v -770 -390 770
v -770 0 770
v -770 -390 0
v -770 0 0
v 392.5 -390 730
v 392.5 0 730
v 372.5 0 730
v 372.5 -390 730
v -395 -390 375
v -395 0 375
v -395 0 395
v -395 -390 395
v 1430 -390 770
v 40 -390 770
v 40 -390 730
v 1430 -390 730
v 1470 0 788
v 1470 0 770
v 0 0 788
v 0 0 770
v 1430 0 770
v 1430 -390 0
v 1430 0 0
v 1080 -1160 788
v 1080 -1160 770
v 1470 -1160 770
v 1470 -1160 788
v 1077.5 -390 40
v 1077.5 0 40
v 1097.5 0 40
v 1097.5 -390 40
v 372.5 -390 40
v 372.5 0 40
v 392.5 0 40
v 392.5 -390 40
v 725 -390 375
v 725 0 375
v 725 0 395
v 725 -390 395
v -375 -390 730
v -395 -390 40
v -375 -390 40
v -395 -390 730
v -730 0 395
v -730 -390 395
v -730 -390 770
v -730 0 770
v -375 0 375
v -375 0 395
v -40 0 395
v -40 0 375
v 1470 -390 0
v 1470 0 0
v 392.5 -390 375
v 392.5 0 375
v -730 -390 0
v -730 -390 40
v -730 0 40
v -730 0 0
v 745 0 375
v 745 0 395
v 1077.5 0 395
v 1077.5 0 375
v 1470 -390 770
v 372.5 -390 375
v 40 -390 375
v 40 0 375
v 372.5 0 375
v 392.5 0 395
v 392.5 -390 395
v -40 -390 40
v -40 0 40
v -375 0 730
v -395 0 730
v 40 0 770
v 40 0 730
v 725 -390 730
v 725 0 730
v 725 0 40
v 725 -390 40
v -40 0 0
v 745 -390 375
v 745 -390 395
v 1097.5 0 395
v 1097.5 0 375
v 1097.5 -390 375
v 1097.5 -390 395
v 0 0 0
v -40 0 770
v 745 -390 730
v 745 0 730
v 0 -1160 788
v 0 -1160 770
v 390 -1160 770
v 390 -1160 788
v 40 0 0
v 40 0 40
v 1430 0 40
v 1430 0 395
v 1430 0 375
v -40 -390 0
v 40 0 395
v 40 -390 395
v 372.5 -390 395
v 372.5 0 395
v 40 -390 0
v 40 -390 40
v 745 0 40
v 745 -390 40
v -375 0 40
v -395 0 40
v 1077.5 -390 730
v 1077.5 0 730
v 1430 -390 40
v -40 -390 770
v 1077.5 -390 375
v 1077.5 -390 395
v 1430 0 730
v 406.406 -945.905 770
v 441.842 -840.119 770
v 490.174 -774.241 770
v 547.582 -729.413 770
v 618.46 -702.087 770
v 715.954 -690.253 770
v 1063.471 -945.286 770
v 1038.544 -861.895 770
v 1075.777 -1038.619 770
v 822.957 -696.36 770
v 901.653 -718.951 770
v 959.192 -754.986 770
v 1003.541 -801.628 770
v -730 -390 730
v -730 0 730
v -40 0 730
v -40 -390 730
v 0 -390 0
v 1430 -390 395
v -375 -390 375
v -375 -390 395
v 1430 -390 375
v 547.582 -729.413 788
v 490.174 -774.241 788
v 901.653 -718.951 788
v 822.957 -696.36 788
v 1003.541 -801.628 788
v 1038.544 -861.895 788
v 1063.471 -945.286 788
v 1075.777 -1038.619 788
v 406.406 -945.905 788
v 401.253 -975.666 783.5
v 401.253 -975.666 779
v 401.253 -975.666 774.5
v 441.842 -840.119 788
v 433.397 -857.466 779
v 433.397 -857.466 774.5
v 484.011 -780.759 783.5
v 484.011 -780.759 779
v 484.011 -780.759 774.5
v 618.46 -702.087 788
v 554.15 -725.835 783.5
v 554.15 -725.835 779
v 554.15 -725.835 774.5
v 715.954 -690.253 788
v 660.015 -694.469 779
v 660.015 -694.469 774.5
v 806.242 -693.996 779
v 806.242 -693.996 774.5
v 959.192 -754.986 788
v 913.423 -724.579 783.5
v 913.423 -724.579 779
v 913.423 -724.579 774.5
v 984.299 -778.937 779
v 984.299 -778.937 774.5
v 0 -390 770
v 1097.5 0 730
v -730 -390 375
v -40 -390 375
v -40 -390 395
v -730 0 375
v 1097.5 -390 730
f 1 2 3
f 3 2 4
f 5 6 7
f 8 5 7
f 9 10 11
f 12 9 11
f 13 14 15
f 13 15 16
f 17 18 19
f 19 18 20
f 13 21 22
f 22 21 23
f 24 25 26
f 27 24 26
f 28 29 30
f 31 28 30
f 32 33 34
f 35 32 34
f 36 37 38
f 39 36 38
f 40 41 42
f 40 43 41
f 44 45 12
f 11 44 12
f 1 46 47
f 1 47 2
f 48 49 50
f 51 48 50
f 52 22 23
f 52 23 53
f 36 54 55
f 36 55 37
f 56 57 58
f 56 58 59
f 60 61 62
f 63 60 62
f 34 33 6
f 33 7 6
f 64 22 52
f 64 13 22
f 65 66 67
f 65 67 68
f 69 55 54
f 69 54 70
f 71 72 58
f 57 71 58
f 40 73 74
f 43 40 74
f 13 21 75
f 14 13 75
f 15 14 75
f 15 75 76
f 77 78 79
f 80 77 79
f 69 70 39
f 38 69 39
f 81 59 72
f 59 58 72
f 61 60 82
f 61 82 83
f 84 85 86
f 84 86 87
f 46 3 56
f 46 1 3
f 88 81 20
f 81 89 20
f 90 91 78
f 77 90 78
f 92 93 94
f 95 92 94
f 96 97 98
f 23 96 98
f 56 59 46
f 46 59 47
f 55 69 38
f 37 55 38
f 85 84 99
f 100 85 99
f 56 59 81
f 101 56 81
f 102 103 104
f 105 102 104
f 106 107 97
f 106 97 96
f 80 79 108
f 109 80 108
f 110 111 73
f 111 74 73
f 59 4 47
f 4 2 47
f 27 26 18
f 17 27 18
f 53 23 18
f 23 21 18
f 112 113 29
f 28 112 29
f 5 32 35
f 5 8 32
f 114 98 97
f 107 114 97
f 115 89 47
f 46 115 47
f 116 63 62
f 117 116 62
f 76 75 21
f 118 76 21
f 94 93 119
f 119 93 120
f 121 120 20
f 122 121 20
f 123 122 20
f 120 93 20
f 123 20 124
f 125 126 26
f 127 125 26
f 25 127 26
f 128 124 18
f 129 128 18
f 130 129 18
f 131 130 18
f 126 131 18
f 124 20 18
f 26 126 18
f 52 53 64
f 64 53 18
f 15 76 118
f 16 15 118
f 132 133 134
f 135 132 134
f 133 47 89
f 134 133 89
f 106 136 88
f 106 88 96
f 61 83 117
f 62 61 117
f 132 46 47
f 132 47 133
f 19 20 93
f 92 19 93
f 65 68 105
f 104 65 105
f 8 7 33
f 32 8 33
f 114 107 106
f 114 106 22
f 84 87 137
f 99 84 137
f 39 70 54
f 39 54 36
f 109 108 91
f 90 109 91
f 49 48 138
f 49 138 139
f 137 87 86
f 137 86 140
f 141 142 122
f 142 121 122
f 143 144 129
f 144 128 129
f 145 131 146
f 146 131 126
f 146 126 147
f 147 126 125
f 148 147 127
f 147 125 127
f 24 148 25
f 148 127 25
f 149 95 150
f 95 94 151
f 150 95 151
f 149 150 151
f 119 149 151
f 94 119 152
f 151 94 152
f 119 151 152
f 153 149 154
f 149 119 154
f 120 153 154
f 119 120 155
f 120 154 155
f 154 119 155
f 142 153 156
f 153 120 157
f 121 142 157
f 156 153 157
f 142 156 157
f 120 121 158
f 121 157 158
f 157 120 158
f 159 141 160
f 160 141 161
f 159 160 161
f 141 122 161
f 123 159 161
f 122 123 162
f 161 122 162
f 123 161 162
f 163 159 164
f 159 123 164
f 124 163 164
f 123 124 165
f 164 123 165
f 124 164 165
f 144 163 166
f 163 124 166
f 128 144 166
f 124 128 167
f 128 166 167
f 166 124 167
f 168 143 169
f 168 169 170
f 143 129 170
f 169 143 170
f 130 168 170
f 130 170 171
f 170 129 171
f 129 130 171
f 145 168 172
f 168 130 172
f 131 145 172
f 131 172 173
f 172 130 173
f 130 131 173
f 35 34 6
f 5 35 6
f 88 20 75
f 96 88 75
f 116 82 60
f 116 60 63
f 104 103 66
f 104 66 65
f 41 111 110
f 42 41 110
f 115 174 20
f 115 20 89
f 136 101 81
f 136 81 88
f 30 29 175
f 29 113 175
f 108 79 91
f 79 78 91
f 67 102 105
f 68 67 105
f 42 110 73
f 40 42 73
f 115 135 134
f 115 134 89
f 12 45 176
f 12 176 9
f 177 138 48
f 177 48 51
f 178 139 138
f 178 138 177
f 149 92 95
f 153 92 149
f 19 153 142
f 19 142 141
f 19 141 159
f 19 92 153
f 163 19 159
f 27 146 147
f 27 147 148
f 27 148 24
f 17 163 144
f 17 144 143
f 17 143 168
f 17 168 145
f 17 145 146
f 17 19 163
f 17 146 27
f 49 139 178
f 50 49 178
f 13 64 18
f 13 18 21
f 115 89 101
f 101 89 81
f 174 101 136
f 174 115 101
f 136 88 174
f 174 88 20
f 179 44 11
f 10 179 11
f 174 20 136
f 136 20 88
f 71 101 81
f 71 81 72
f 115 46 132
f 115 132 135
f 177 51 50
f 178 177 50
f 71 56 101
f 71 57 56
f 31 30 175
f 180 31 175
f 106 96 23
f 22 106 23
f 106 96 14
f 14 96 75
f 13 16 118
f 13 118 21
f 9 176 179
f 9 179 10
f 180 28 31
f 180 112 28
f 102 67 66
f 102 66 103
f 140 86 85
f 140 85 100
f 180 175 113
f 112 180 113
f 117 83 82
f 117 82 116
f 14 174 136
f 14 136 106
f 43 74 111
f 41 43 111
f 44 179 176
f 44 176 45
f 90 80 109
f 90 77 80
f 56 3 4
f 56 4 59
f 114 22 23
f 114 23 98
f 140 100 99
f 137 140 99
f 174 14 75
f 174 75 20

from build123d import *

# Parameters (mm, degrees)
F1_DEPTH = 390
F2_DEPTH = 390
F0_W     = 335
F0_H     = 20
F0_W_2   = 332.5
F3_DEPTH = 390
F4_W     = 1390
F4_H     = 390
F5_DEPTH = 18


with BuildPart() as f1:
    # F0 (on Front) → F1 (new body)
    with BuildSketch(Plane.XZ):
        Polygon((-770, 0), (-730, 0), (-730, 40), (-730, 375), (-730, 395), (-730, 730), (-730, 770), (-770, 770), align=None)
    extrude(amount=F1_DEPTH)


with BuildPart() as f1b:
    # F0 (on Front) → F1, piece 2 (new body)
    with BuildSketch(Plane.XZ):
        Polygon((-395, 40), (-375, 40), (-375, 375), (-375, 395), (-375, 730), (-395, 730), (-395, 395), (-395, 375), align=None)
    extrude(amount=F1_DEPTH)


with BuildPart() as f1c:
    # F0 (on Front) → F1, piece 3 (new body)
    with BuildSketch(Plane.XZ):
        Polygon((-40, 0), (0, 0), (0, 770), (-40, 770), (-40, 730), (-40, 395), (-40, 375), (-40, 40), align=None)
    extrude(amount=F1_DEPTH)


with BuildPart() as f1d:
    # F0 (on Front) → F1, piece 4 (new body)
    with BuildSketch(Plane.XZ):
        Polygon((372.5, 375), (372.5, 40), (392.5, 40), (392.5, 375), (392.5, 395), (392.5, 730), (372.5, 730), (372.5, 395), align=None)
    extrude(amount=F1_DEPTH)


with BuildPart() as f1e:
    # F0 (on Front) → F1, piece 5 (new body)
    with BuildSketch(Plane.XZ):
        Polygon((725, 375), (725, 40), (745, 40), (745, 375), (745, 395), (745, 730), (725, 730), (725, 395), align=None)
    extrude(amount=F1_DEPTH)


with BuildPart() as f1f:
    # F0 (on Front) → F1, piece 6 (new body)
    with BuildSketch(Plane.XZ):
        Polygon((1077.5, 40), (1097.5, 40), (1097.5, 375), (1097.5, 395), (1097.5, 730), (1077.5, 730), (1077.5, 395), (1077.5, 375), align=None)
    extrude(amount=F1_DEPTH)


with BuildPart() as f1g:
    # F0 (on Front) → F1, piece 7 (new body)
    with BuildSketch(Plane.XZ):
        Polygon((1430, 40), (1430, 0), (1470, 0), (1470, 770), (1430, 770), (1430, 730), (1430, 395), (1430, 375), align=None)
    extrude(amount=F1_DEPTH)


with BuildPart() as f2:
    # F0 (on Front) → F2 (new body)
    with BuildSketch(Plane.XZ):
        Polygon((-40, 730), (-40, 770), (-730, 770), (-730, 730), (-395, 730), (-375, 730), align=None)
    extrude(amount=F2_DEPTH)


with BuildPart() as f2b:
    # F0 (on Front) → F2, piece 2 (new body)
    with BuildSketch(Plane.XZ):
        with Locations((-562.5, 385)):
            Rectangle(F0_W, F0_H)
    extrude(amount=F2_DEPTH)


with BuildPart() as f2c:
    # F0 (on Front) → F2, piece 3 (new body)
    with BuildSketch(Plane.XZ):
        with Locations((-207.5, 385)):
            Rectangle(F0_W, F0_H)
    extrude(amount=F2_DEPTH)


with BuildPart() as f2d:
    # F0 (on Front) → F2, piece 4 (new body)
    with BuildSketch(Plane.XZ):
        Polygon((-730, 0), (-40, 0), (-40, 40), (-375, 40), (-395, 40), (-730, 40), align=None)
    extrude(amount=F2_DEPTH)


with BuildPart() as f2e:
    # F0 (on Front) → F2, piece 5 (new body)
    with BuildSketch(Plane.XZ):
        Polygon((0, 770), (0, 0), (40, 0), (40, 40), (40, 375), (40, 395), (40, 730), (40, 770), align=None)
    extrude(amount=F2_DEPTH)


with BuildPart() as f2f:
    # F0 (on Front) → F2, piece 6 (new body)
    with BuildSketch(Plane.XZ):
        with Locations((558.75, 385)):
            Rectangle(F0_W_2, F0_H)
    extrude(amount=F2_DEPTH)


with BuildPart() as f2g:
    # F0 (on Front) → F2, piece 7 (new body)
    with BuildSketch(Plane.XZ):
        with Locations((911.25, 385)):
            Rectangle(F0_W_2, F0_H)
    extrude(amount=F2_DEPTH)


with BuildPart() as f2h:
    # F0 (on Front) → F2, piece 8 (new body)
    with BuildSketch(Plane.XZ):
        with Locations((1263.75, 385)):
            Rectangle(F0_W_2, F0_H)
    extrude(amount=F2_DEPTH)


with BuildPart() as f3:
    # F0 (on Front) → F3 (new body)
    with BuildSketch(Plane.XZ):
        Polygon((40, 40), (40, 0), (1430, 0), (1430, 40), (1097.5, 40), (1077.5, 40), (745, 40), (725, 40), (392.5, 40), (372.5, 40), align=None)
    extrude(amount=F3_DEPTH)


with BuildPart() as f3b:
    # F0 (on Front) → F3, piece 2 (new body)
    with BuildSketch(Plane.XZ):
        with Locations((206.25, 385)):
            Rectangle(F0_W_2, F0_H)
    extrude(amount=F3_DEPTH)


with BuildPart() as f3c:
    # F0 (on Front) → F3, piece 3 (new body)
    with BuildSketch(Plane.XZ):
        Polygon((1430, 770), (40, 770), (40, 730), (372.5, 730), (392.5, 730), (725, 730), (745, 730), (1077.5, 730), (1097.5, 730), (1430, 730), align=None)
    extrude(amount=F3_DEPTH)


with BuildPart() as f5:
    # F4 (on face) → F5 (new body)
    with BuildSketch(Plane.XY.offset(770)):
        with BuildLine():
            Line((40, 0), (0, 0))
            Line((0, 0), (0, -390))
            Line((0, -390), (0, -1160))
            Line((0, -1160), (390, -1160))
            add(Edge.make_bspline(
                [(390, -1160), (390, -932.241499424), (454.8877808063, -770.199781247), (600.7550063969, -690), (735, -690)],
                knots=[0, 0, 0, 0, 0.5492145586, 1, 1, 1, 1], degree=3))
            add(Edge.make_bspline(
                [(1080, -1160), (1080, -932.241499424), (1015.1122191937, -770.199781247), (869.2449936031, -690), (735, -690)],
                knots=[0, 0, 0, 0, 0.5492145586, 1, 1, 1, 1], degree=3))
            Line((1080, -1160), (1470, -1160))
            Line((1470, -1160), (1470, -390))
            Line((1470, -390), (1470, 0))
            Line((1470, 0), (1430, 0))
            Line((1430, 0), (1430, -390))
            Line((1430, -390), (40, -390))
            Line((40, -390), (40, 0))
        make_face()
        with Locations((735, -195)):
            Rectangle(F4_W, F4_H)
    extrude(amount=F5_DEPTH)


solid = Compound([f1.part, f1b.part, f1c.part, f1d.part, f1e.part, f1f.part, f1g.part, f2.part, f2b.part, f2c.part, f2d.part, f2e.part, f2f.part, f2g.part, f2h.part, f3.part, f3b.part, f3c.part, f5.part])
